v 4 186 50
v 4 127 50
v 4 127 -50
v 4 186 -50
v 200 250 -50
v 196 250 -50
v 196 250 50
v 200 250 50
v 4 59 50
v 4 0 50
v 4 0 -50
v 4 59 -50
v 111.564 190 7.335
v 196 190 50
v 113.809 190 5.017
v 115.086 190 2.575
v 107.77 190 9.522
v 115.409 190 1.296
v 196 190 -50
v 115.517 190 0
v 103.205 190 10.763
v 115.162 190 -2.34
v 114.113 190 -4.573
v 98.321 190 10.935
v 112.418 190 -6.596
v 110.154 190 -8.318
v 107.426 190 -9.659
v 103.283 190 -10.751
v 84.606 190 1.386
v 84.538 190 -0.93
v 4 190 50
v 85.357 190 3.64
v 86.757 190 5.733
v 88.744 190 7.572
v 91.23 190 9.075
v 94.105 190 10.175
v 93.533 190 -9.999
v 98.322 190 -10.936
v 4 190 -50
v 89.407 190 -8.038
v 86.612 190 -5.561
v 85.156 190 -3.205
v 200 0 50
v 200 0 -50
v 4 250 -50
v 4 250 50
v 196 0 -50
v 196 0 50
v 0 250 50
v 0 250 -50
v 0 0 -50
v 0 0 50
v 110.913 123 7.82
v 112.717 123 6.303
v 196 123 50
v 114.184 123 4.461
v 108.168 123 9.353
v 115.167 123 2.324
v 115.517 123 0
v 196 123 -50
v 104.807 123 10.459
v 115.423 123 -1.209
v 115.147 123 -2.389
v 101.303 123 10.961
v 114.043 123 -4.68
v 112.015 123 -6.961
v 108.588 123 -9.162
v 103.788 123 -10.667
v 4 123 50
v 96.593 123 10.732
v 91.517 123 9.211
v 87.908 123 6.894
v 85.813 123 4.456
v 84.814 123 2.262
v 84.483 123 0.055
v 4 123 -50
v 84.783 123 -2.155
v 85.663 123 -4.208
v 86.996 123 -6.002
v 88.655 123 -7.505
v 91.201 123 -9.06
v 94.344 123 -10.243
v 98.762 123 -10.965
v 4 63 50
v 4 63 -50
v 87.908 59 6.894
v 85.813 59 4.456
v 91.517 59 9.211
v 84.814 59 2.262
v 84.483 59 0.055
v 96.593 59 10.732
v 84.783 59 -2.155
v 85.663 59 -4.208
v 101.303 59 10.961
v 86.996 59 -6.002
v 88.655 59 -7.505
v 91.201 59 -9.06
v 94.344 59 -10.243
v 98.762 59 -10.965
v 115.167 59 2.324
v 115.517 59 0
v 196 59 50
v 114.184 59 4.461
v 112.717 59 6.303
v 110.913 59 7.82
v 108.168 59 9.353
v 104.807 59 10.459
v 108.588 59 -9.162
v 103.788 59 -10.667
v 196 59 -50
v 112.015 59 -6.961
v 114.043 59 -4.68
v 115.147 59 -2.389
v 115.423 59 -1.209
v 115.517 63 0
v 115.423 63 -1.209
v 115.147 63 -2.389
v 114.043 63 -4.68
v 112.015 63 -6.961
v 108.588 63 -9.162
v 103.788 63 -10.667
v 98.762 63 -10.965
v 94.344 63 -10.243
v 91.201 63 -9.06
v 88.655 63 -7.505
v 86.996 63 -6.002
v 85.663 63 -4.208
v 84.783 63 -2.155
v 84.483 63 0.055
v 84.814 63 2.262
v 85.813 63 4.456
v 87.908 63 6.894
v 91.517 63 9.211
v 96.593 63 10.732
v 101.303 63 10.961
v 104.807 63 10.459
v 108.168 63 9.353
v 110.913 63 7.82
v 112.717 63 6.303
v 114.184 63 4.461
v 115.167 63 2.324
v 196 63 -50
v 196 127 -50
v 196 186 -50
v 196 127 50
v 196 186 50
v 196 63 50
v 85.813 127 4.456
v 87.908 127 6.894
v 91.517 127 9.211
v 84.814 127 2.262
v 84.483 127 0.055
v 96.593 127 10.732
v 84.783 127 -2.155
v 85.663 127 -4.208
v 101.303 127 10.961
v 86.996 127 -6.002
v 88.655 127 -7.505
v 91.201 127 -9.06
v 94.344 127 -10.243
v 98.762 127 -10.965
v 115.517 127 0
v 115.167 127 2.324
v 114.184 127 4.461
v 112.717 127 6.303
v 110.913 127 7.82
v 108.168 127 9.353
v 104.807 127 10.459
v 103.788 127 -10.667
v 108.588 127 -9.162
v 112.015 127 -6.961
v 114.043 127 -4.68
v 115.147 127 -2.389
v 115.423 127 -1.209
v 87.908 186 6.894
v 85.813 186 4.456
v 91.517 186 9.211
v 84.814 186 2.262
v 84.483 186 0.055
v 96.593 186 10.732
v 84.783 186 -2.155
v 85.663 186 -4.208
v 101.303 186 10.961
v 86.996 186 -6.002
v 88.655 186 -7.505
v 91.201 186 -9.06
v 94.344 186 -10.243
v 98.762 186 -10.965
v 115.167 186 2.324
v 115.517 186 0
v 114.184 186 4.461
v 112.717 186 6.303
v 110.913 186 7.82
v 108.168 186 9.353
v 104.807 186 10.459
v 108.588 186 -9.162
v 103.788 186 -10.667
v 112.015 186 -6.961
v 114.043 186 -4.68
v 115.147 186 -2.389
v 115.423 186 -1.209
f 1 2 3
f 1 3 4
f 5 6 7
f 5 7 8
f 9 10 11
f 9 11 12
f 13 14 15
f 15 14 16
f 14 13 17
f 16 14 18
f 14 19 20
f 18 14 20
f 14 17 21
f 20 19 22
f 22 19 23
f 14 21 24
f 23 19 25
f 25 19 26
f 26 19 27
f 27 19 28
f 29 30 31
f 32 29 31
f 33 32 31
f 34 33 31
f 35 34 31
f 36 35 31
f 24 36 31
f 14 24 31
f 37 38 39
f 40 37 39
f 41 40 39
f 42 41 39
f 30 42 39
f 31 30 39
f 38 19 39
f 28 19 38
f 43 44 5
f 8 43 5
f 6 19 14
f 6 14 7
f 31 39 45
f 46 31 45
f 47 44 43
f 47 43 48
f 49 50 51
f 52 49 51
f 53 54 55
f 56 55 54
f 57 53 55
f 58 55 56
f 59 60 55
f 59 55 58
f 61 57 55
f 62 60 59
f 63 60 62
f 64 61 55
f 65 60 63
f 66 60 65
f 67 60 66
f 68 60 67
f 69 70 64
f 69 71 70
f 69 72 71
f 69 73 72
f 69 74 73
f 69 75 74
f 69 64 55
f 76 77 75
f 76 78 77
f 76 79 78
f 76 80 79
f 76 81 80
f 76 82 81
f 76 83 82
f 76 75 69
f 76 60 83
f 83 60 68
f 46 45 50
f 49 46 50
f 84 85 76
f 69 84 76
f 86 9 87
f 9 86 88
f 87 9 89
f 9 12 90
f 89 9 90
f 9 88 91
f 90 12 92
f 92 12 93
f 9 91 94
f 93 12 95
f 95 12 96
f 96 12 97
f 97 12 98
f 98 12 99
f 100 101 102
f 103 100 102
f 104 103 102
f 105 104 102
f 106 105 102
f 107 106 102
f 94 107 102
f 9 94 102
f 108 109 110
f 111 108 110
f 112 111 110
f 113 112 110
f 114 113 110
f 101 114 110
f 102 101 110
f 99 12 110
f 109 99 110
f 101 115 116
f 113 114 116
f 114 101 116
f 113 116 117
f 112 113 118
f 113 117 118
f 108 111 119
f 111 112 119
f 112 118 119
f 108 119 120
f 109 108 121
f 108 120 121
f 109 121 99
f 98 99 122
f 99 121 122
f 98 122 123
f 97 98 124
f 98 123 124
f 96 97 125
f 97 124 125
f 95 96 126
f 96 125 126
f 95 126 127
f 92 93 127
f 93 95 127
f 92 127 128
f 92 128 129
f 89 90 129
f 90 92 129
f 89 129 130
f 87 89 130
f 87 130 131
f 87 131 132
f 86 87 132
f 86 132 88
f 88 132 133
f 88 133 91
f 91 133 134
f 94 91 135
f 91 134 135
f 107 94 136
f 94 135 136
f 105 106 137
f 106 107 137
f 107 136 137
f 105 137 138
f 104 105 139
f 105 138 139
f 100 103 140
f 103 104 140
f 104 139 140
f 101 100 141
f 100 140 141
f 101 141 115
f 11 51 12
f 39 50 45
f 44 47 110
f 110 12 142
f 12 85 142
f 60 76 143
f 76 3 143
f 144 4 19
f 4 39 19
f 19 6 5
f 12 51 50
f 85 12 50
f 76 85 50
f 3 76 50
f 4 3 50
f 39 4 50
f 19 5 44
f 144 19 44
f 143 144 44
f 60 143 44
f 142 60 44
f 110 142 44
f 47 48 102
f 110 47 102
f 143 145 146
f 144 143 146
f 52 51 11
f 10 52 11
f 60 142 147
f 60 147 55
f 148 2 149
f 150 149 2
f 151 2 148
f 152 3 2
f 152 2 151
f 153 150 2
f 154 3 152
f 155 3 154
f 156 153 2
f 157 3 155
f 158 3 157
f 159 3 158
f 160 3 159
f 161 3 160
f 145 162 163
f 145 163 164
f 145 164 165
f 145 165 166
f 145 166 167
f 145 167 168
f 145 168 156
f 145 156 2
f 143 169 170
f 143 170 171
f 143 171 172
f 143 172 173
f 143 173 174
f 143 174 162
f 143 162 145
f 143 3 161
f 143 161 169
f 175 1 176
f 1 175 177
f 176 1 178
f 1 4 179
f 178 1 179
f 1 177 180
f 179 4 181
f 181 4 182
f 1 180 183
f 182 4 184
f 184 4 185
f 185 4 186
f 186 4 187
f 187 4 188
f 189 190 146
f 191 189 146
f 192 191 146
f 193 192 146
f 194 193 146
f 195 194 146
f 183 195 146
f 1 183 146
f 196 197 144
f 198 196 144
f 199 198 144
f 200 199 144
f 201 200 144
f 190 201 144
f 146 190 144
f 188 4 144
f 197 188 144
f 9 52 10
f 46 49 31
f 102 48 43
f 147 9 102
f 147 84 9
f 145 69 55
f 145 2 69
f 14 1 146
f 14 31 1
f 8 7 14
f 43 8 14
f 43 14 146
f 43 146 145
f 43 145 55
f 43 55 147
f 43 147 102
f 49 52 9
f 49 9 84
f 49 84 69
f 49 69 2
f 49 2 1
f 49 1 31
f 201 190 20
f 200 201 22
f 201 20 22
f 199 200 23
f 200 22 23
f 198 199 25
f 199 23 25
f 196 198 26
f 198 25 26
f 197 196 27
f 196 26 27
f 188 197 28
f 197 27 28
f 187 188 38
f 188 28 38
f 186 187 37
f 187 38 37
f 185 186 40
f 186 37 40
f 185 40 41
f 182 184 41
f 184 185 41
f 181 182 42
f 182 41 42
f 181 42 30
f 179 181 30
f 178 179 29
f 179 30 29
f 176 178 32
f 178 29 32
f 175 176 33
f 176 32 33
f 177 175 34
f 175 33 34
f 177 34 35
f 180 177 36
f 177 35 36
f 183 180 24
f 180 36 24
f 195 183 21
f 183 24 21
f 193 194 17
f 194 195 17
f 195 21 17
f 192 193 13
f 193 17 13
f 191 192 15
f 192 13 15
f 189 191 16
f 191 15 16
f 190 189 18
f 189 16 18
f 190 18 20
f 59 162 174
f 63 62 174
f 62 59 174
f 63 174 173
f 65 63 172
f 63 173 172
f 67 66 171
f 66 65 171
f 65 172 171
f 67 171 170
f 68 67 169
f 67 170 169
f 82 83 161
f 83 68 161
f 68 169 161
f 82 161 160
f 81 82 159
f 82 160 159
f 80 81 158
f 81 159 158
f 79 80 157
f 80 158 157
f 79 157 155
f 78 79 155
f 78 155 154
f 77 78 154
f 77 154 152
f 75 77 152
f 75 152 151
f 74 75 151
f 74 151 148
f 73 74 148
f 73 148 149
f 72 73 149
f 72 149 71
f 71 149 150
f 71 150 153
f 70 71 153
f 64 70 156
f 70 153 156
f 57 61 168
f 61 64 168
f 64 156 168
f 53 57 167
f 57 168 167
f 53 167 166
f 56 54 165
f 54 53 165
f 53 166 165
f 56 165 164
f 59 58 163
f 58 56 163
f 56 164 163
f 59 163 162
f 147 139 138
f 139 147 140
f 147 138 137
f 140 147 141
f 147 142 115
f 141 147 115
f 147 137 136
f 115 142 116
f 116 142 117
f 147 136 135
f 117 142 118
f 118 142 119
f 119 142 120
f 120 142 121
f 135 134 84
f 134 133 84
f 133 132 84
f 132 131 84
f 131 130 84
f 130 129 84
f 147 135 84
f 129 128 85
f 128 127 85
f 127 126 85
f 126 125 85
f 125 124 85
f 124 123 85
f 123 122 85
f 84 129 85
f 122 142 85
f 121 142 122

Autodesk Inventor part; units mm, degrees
ref_plane "YZ Plane" through (0, 0, 0) normal (1, 0, 0) x (0, 1, 0)
ref_plane "XZ Plane" through (0, 0, 0) normal (0, 1, 0) x (-1, 0, 0)
ref_plane "XY Plane" through (0, 0, 0) normal (0, 0, 1) x (1, 0, 0)
sketch "Эскиз1" plane through (0, 0, 0) normal (0, 0, 1) x (1, 0, 0)
  line L0 (0, 0) -> (200, 0) construction
  line L1 (10.5713, 250) -> (75.6527, 250) construction
  line L2 (98, 0) -> (102, 0) construction
  line L3 (102, 0) -> (102, 250) construction
  line L4 (98, 250) -> (102, 250) construction
  line L5 (98, 0) -> (98, 250) construction
  line L6 (98, 250) -> (102, 0) construction
  line L7 (0, 127) -> (200, 127)
  line L8 (200, 127) -> (200, 123)
  line L9 (200, 123) -> (0, 123)
  line L10 (0, 123) -> (0, 127)
  line L11 (0, 127) -> (200, 123) construction
  line L12 (200, 127) -> (0, 123) construction
  line L13 (0, 186) -> (200, 186)
  line L14 (200, 186) -> (200, 190)
  line L15 (200, 190) -> (0, 190)
  line L16 (0, 190) -> (0, 186)
  line L17 (0, 0) -> (4, 0)
  line L18 (4, 0) -> (4, 250)
  line L19 (4, 250) -> (0, 250)
  line L20 (0, 250) -> (0, 0)
  line L21 (200, 0) -> (196, 0)
  line L22 (196, 0) -> (196, 250)
  line L23 (196, 250) -> (200, 250)
  line L24 (200, 250) -> (200, 0)
  line L25 (0, 59) -> (200, 59)
  line L26 (200, 59) -> (200, 63)
  line L27 (200, 63) -> (0, 63)
  line L28 (0, 63) -> (0, 59)
  arc A0 (193.3786, 241.9343) -> (189.4287, 250) centre (189.4287, 245) ccw projected
  arc A1 (10.5713, 250) -> (6.6214, 241.9343) centre (10.5713, 245) ccw projected
  arc A2 (0, 0) -> (6.6214, 241.9343) centre (-144.0414, 125) ccw projected
  arc A3 (193.3786, 241.9343) -> (200, 0) centre (344.0414, 125) ccw projected
  arc A4 (78.2507, 248.5) -> (75.6527, 250) centre (75.6527, 247) ccw projected
  line L29 (124.3473, 250) -> (189.4287, 250) projected
  arc A5 (124.3473, 250) -> (121.7493, 248.5) centre (124.3473, 247) ccw projected
  line L30 (121.7493, 248.5) -> (112.751, 232.9146) projected
  arc A6 (108.4209, 230.4146) -> (112.751, 232.9146) centre (108.4209, 235.4146) ccw projected
  line L31 (108.4209, 230.4146) -> (91.5791, 230.4146) projected
  arc A7 (87.249, 232.9146) -> (91.5791, 230.4146) centre (91.5791, 235.4146) ccw projected
  line L32 (87.249, 232.9146) -> (78.2507, 248.5) projected
  point P0 (100, 125)
  point P1 (4, 186)
  point P2 (196, 186)
  point P3 (196, 127)
  point P4 (4, 127)
  point P5 (0, 186)
  point P6 (4, 123)
  point P7 (196, 123)
  point P8 (196, 190)
  point P9 (4, 190)
  point P10 (0, 190)
  point P11 (196, 63)
  point P12 (4, 63)
  point P13 (4, 59)
  point P14 (196, 59)
  dimension "d0" = 200
  dimension "d1" = 4
  dimension "d2" = 200
  dimension "d3" = 4
  dimension "d4" = 4
  dimension "d5" = 250
  dimension "d6" = 4
  dimension "d7" = 250
  dimension "d10" = 60
  dimension "d11" = 200
  dimension "d12" = 4
  dimension "d13" = 60
extrude "Выдавливание1" add sketch "Эскиз1" along normal mid plane 100 contours L20 L13 L18 L7 | L7 L18 L9 L10 | L7 A2 L9 L18 | L9 L18 L27 L20 | L16 L15 L18 L13 | L7 A3 L9 A2 | L18 L15 A2 L13 | L27 L18 L25 L20 | L20 L19 L18 L15 | L7 L22 L9 A3 | A2 L15 A3 L13 | L27 A2 L25 L18 | L25 L18 A2 L20 | L22 L13 L24 L7 | L7 L8 L9 L22 | A3 L15 L22 L13 | L27 A3 L25 A2 | A2 L18 L17 | L9 L24 L27 L22 | L22 L15 L14 L13 | L27 L22 L25 A3 | L27 L24 L25 L22 | L22 L23 L24 L15 | L25 L24 A3 L22 | A3 L21 L22
sketch "Эскиз2" plane through (4, 190, 50) normal (0, 1, 0) x (1, 0, 0)
  line L0 (196, 100) -> (196, 0) projected
  line L1 (-4, 0) -> (196, 100) construction
  ellipse E0 centre (96, 50) end of major axis (111.5174, 50) minor radius 11
  point P0 (-4, 50)
  dimension "d16" = 11
extrude "Выдавливание2" cut sketch "Эскиз2" against normal blind 300
properties part number "ребра для шкафа"
